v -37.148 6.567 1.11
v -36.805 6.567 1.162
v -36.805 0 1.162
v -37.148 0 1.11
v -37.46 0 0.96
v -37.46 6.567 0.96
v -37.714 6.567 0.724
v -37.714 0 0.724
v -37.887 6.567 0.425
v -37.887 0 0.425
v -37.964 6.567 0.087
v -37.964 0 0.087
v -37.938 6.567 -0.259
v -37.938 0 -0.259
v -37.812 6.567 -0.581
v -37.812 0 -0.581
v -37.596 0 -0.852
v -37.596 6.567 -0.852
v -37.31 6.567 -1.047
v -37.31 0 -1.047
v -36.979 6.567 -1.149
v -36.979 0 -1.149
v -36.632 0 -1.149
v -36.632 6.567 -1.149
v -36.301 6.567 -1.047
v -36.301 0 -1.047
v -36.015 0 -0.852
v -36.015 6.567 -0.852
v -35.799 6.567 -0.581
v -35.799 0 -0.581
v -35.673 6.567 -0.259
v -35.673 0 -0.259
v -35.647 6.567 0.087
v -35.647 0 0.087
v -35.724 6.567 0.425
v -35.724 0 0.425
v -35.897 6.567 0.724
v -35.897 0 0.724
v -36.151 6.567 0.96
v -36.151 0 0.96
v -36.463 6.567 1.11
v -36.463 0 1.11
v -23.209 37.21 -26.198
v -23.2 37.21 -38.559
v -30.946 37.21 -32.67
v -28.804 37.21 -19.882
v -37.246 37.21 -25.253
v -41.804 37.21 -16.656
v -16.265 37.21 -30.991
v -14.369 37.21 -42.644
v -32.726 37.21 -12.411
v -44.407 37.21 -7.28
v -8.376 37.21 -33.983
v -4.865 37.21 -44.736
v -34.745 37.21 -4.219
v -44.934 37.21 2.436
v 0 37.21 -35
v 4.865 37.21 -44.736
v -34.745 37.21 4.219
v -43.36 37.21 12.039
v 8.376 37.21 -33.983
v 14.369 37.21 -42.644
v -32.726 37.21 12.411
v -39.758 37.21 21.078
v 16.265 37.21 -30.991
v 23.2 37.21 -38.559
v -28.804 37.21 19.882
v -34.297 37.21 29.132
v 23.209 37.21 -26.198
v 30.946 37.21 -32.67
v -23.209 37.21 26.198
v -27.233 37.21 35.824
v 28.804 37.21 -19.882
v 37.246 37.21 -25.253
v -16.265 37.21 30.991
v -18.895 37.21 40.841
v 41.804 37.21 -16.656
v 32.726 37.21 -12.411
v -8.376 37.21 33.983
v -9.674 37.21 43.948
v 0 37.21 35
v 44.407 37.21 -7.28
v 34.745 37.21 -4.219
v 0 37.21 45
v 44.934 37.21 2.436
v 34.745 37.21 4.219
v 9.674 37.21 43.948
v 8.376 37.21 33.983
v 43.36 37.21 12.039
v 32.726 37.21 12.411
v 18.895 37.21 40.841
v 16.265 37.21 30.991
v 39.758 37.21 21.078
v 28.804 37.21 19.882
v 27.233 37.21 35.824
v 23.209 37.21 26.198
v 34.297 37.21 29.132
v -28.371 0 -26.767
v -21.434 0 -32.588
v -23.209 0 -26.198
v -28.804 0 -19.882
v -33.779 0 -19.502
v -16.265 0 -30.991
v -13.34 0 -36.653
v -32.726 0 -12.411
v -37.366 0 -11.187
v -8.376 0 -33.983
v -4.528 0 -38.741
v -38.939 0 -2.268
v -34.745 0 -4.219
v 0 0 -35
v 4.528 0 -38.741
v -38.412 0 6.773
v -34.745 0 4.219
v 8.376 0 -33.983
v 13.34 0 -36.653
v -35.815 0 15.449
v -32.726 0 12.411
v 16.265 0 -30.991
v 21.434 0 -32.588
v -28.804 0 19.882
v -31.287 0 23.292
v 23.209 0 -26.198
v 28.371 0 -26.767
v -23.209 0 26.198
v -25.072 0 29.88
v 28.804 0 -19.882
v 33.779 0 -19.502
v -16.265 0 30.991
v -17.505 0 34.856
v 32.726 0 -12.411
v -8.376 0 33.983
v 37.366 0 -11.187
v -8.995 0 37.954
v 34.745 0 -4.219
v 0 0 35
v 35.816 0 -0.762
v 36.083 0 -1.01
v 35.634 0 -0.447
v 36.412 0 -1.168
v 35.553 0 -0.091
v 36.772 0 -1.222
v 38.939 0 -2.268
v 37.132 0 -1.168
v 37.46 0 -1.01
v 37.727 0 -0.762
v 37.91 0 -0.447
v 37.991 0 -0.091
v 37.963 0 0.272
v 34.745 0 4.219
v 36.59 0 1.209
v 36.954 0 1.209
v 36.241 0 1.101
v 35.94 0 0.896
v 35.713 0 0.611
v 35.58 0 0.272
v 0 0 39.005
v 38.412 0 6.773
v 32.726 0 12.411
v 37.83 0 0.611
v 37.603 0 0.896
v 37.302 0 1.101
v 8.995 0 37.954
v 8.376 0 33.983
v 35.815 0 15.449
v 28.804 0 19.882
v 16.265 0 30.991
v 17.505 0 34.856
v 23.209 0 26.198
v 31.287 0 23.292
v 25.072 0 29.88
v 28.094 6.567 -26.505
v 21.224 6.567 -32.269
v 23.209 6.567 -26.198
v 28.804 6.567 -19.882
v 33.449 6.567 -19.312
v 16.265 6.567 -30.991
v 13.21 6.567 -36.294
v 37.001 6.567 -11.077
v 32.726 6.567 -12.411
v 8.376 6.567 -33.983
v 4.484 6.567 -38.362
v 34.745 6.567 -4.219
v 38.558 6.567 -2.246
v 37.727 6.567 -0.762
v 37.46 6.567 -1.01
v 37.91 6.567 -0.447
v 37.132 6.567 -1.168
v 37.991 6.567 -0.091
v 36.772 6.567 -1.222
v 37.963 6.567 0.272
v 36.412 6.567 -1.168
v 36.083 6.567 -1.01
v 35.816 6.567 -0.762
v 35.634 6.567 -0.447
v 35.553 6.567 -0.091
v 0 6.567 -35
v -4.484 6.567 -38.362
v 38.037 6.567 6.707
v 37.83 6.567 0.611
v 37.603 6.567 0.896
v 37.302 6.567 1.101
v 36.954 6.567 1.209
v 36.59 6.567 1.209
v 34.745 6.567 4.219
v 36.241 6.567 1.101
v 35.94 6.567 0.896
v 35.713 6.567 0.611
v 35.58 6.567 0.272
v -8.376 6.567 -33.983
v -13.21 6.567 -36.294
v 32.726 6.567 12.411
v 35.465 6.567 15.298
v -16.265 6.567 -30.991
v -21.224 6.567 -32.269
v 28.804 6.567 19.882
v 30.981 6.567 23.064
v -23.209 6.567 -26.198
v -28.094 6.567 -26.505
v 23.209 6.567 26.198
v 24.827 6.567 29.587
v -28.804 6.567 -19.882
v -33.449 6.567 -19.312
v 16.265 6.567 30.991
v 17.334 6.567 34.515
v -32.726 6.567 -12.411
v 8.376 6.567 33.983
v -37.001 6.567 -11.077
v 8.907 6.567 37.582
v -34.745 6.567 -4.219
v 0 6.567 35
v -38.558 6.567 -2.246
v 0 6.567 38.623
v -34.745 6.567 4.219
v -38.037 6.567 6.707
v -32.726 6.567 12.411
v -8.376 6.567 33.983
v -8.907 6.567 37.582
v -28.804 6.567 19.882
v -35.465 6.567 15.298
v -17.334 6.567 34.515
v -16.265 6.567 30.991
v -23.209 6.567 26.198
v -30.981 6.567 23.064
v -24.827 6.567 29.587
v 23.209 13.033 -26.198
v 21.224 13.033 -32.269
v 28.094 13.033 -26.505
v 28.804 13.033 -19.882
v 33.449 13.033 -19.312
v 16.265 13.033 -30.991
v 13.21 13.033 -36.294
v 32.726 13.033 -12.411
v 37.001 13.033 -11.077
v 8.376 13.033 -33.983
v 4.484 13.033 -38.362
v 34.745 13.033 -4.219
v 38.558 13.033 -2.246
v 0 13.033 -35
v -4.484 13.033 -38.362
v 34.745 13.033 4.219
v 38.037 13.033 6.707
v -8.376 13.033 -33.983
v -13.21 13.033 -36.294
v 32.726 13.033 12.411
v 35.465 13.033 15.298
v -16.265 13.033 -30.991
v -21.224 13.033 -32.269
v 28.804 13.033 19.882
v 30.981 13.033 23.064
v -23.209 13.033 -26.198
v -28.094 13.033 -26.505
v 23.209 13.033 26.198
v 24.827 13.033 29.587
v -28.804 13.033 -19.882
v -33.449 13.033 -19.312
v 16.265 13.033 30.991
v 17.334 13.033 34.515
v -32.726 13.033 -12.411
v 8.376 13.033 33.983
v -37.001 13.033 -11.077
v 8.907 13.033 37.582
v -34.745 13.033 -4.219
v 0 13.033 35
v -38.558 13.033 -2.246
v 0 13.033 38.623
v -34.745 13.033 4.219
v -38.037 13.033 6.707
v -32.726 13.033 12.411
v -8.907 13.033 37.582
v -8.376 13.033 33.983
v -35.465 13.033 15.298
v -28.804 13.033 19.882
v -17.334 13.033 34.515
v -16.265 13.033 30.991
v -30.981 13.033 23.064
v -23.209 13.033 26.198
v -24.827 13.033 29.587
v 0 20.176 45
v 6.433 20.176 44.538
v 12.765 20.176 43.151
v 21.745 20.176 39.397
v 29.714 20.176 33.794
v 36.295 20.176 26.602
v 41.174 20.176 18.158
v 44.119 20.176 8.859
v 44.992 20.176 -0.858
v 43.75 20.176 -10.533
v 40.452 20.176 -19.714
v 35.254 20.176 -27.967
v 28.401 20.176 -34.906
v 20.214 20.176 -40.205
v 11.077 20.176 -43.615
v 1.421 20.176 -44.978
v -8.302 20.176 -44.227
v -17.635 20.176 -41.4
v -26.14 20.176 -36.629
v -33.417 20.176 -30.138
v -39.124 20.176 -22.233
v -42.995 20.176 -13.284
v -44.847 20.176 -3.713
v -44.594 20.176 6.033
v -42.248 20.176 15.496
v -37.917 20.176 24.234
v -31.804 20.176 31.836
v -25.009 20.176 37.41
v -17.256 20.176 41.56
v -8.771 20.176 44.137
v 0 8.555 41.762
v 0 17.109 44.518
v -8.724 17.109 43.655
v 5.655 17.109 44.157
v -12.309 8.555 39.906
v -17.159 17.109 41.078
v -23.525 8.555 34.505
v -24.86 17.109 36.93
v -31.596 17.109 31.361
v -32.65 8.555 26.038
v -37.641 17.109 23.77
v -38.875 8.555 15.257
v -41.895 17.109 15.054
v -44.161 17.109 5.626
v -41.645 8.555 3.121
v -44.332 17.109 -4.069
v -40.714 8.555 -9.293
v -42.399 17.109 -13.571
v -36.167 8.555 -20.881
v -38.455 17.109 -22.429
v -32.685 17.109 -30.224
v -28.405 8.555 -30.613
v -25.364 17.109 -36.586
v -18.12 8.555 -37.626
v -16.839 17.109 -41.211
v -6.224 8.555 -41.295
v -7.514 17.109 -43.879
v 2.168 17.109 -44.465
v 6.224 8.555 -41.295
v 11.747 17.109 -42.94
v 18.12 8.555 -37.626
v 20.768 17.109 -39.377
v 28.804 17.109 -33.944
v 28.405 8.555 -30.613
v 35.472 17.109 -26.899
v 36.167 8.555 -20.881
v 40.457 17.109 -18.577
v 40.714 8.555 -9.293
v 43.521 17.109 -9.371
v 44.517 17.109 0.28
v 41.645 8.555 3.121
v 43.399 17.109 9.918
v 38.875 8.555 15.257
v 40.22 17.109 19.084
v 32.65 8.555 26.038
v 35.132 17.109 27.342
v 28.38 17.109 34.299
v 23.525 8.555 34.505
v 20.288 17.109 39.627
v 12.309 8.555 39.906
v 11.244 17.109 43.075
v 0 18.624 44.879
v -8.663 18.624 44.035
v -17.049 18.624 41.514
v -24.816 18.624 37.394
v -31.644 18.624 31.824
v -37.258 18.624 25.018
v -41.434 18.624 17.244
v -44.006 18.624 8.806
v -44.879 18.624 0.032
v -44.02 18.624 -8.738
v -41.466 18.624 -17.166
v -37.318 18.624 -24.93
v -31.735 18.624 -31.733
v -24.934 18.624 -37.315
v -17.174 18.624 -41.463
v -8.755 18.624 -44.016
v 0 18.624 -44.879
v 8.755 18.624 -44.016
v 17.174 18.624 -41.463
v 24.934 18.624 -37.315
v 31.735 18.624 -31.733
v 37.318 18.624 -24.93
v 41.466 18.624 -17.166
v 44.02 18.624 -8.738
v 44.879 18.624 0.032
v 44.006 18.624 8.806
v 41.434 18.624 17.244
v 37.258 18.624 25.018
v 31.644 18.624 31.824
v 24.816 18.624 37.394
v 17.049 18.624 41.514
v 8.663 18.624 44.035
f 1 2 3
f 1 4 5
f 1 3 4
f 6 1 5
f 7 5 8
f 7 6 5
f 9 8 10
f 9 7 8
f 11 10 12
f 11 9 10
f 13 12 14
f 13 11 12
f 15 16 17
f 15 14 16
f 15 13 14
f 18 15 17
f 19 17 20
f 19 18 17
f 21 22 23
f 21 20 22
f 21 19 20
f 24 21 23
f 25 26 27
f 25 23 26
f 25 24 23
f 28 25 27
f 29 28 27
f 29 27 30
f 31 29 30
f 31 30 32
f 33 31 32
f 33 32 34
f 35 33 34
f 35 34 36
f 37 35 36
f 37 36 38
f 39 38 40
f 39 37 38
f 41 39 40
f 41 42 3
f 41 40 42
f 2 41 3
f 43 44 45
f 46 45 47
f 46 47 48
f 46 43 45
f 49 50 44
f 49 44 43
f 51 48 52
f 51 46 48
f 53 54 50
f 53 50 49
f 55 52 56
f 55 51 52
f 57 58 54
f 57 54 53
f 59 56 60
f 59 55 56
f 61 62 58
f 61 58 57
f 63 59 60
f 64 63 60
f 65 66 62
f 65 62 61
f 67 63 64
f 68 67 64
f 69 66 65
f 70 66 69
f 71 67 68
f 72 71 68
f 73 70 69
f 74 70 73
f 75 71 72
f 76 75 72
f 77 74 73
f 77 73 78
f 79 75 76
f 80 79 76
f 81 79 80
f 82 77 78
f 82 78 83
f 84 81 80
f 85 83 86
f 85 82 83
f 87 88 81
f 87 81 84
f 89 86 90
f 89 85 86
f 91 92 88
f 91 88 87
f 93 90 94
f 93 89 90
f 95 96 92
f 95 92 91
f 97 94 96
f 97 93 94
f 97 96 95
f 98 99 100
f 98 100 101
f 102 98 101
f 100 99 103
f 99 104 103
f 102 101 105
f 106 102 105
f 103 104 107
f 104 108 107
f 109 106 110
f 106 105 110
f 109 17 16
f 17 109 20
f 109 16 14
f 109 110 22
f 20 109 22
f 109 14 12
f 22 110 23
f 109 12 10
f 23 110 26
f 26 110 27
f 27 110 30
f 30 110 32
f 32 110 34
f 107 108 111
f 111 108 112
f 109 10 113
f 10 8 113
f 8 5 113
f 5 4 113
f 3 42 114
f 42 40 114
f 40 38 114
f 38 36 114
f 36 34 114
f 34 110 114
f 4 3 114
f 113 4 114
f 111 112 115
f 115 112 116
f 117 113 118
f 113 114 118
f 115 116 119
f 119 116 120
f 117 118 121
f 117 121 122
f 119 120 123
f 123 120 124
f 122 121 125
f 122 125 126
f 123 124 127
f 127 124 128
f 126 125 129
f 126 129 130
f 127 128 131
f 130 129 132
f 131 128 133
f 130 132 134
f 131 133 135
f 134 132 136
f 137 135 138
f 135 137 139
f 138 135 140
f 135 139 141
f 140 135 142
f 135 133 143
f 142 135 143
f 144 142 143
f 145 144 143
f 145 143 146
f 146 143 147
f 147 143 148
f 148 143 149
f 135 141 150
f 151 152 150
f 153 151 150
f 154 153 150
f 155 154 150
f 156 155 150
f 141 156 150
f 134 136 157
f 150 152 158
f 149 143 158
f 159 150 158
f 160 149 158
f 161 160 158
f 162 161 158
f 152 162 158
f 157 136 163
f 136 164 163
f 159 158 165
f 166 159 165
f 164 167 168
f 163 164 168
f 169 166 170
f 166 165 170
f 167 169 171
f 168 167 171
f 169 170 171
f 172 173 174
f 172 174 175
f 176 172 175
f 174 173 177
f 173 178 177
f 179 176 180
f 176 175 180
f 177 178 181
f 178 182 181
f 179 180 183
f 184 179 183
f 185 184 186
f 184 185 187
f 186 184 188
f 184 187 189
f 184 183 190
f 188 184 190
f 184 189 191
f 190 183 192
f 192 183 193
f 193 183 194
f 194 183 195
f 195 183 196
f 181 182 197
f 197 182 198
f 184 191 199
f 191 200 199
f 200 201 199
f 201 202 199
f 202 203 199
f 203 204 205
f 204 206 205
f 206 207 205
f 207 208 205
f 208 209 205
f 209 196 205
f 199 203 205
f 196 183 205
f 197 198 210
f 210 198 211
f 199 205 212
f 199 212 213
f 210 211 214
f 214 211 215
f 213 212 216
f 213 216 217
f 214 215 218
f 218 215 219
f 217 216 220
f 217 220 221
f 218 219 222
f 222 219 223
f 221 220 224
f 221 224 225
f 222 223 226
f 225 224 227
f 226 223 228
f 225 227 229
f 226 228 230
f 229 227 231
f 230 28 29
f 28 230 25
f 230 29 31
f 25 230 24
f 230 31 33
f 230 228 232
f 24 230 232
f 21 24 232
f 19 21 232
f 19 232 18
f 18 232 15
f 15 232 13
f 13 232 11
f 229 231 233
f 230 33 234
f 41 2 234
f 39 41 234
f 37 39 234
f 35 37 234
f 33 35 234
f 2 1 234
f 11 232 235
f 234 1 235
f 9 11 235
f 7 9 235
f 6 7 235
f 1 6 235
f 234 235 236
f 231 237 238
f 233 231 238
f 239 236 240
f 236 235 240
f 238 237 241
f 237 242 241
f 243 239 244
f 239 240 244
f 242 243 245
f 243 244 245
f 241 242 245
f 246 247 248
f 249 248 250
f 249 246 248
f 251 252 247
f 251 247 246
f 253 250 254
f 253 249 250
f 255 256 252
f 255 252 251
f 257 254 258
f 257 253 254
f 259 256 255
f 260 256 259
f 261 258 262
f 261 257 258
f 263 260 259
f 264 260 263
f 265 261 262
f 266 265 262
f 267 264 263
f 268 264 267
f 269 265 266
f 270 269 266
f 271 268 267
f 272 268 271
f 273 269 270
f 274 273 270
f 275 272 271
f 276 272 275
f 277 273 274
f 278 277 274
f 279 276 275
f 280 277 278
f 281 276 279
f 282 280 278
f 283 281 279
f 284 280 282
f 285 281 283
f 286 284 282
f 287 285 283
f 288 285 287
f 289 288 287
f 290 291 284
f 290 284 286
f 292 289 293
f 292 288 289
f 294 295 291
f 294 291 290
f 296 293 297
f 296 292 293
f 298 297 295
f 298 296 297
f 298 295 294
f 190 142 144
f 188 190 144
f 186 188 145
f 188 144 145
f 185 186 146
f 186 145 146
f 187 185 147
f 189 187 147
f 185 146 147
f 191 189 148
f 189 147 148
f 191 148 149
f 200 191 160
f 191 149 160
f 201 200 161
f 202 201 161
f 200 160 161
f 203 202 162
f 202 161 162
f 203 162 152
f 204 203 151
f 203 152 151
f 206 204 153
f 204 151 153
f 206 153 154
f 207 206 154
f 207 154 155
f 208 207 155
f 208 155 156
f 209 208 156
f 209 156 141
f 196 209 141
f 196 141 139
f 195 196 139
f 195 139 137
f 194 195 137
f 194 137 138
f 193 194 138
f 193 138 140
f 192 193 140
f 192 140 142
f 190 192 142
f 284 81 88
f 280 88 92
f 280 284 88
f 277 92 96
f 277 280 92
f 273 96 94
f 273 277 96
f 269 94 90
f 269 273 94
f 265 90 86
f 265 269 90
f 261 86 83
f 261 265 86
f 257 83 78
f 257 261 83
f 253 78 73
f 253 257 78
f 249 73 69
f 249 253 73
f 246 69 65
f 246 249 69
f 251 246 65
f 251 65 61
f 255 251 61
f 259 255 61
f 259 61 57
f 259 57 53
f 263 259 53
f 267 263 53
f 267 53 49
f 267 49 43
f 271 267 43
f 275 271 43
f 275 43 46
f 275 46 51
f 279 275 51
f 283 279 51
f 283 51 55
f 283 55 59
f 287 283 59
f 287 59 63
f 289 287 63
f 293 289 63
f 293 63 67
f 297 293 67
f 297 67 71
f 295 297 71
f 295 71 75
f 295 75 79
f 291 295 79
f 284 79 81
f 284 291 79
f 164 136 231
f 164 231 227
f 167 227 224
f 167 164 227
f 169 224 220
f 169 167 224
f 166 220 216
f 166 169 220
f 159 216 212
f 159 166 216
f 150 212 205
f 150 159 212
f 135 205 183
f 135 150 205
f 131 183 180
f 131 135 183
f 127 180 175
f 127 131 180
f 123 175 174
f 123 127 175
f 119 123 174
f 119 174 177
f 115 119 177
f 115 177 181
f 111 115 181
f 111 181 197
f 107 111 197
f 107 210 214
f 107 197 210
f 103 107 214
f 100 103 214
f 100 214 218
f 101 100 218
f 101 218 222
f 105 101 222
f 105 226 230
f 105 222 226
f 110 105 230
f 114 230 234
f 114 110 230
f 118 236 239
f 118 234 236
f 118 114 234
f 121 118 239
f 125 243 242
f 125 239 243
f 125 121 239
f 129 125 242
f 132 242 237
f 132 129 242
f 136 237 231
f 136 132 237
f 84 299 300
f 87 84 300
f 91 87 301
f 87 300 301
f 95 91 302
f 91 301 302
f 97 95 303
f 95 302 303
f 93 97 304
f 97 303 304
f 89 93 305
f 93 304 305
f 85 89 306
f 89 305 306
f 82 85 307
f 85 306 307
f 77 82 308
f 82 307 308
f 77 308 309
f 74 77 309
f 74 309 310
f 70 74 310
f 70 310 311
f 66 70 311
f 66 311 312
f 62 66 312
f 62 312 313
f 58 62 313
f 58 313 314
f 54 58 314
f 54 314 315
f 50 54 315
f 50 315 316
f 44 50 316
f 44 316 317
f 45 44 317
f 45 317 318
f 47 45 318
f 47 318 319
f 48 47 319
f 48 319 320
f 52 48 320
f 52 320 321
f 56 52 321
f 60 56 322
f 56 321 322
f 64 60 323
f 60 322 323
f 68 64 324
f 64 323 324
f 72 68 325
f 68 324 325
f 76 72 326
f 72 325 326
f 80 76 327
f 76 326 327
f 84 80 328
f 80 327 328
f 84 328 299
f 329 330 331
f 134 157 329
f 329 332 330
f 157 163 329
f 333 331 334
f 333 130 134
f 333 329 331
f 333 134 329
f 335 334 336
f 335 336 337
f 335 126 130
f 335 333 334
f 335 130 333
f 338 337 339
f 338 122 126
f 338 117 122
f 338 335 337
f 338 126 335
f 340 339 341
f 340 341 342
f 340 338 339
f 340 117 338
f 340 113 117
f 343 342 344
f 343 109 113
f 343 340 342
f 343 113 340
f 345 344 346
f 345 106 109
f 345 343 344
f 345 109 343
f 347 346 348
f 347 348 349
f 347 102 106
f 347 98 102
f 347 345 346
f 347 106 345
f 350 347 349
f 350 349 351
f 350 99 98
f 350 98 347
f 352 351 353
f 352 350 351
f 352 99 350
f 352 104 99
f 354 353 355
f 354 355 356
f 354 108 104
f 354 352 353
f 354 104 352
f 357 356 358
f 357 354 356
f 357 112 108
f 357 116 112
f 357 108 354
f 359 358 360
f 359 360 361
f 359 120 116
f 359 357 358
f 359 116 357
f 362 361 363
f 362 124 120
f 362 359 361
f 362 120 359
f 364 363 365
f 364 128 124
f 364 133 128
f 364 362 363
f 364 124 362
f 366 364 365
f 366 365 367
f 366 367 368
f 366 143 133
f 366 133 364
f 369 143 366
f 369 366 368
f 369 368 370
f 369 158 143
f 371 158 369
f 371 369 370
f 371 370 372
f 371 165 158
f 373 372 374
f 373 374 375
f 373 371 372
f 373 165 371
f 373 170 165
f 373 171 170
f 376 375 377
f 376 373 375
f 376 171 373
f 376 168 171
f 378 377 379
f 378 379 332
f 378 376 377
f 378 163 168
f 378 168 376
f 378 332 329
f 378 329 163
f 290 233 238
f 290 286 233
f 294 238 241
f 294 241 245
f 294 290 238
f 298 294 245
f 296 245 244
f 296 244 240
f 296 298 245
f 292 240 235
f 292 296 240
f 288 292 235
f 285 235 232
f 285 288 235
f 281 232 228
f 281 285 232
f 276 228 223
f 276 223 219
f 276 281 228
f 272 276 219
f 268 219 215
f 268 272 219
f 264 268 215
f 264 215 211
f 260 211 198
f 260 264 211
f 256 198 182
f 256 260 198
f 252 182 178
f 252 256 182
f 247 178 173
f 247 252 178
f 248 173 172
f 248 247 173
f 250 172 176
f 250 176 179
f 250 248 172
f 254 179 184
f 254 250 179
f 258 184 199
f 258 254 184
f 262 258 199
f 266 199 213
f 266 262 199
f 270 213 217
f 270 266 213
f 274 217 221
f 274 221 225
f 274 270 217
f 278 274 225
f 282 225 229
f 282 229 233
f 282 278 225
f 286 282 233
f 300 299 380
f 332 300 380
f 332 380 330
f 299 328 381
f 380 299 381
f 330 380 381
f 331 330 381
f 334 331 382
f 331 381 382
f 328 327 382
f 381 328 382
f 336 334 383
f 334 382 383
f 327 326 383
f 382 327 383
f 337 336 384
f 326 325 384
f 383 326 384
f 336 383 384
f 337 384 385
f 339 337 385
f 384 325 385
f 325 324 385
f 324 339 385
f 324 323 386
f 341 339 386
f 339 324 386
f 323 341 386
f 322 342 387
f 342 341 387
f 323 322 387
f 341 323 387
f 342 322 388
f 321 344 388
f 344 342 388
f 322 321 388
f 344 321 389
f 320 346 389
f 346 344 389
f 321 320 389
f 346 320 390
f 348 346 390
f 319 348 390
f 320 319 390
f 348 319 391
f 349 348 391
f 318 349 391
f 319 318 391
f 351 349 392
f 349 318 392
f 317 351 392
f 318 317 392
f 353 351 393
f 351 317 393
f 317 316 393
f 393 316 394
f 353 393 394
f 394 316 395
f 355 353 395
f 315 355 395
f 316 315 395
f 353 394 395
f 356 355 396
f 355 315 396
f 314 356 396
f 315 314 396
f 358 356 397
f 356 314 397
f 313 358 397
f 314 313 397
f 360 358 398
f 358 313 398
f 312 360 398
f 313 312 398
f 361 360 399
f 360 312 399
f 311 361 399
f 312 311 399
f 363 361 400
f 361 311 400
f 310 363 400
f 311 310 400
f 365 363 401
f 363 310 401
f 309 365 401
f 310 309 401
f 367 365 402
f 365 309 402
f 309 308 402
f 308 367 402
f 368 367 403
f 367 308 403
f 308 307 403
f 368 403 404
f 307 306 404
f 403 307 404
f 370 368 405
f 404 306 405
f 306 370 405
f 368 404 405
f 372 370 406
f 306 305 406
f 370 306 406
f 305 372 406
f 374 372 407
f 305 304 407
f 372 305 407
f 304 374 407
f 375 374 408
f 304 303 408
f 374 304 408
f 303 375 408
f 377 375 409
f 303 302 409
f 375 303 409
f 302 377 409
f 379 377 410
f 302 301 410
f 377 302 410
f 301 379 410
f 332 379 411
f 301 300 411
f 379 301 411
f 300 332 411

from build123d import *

# Parameters (mm, degrees)
SKETCH1_R               = 45
SKETCH1_R_2             = 35
BOSS_EXTRUDE1_DEPTH     = 37.21
FILLET1_R               = 10
SKETCH3_W               = 3.623403209
SKETCH3_H               = 6.465591727
CUT_EXTRUDE3_DEPTH      = 74.719632638
CUT_EXTRUDE3_DEPTH_BACK = 10
SKETCH4_R               = 1.161936473
SKETCH5_R               = 1.222255242
CUT_EXTRUDE4_DEPTH      = 10


with BuildPart() as part:
    # Sketch1 → Boss-Extrude1 (new body)
    with BuildSketch(Plane(origin=(0, 0, 0), x_dir=(1, 0, 0), z_dir=(0, 1, 0))):
        with Locations(Location((0, 0, 0), (0, 0, 270))):
            Circle(SKETCH1_R)
        with Locations(Location((0, 0, 0), (0, 0, 270))):
            Circle(SKETCH1_R_2, mode=Mode.SUBTRACT)
    extrude(amount=BOSS_EXTRUDE1_DEPTH)

    # Sketch2 → Cut-Revolve2 (revolve, cut)
    with BuildSketch(Plane(origin=(0, 0, 0), x_dir=(0, 0, -1), z_dir=(1, 0, 0)), mode=Mode.PRIVATE) as cut_revolve2_sk:
        Polygon((45, 18.605), (39.004948157, 0), (45, 0), align=None)
    revolve(cut_revolve2_sk.sketch.rotate(Axis((0, 37.21, 0), (0, -1, 0)), 180), axis=Axis((0, 37.21, 0), (0, -1, 0)), mode=Mode.SUBTRACT)

    # Fillet1
    fillet1_edges = [part.edges().sort_by_distance(p)[0] for p in [
        (0, 18.605, -45),
    ]]
    fillet(fillet1_edges, radius=FILLET1_R)

    # Sketch3 → Cut-Revolve3 (revolve, cut)
    with BuildSketch(Plane(origin=(0, 0, 0), x_dir=(0, 0, -1), z_dir=(1, 0, 0))):
        with Locations((-36.811701605, 9.799884952)):
            Rectangle(SKETCH3_W, SKETCH3_H)
    revolve(axis=Axis((0, 37.21, 0), (0, -1, 0)), mode=Mode.SUBTRACT)

    # Sketch4 → Cut-Extrude3 (cut, two sides: drawn at the far end of the back side and taken through both)
    with BuildSketch(Plane(origin=(0, 0, 0), x_dir=(-1, 0, 0), z_dir=(0, -1, 0)).offset(-CUT_EXTRUDE3_DEPTH_BACK)):
        with Locations(Location((36.80548689, 0, 0), (0, 0, 270))):
            Circle(SKETCH4_R)
    extrude(amount=CUT_EXTRUDE3_DEPTH + CUT_EXTRUDE3_DEPTH_BACK, mode=Mode.SUBTRACT)

    # Sketch5 → Cut-Extrude4 (cut)
    with BuildSketch(Plane(origin=(0, 0, 0), x_dir=(-1, 0, 0), z_dir=(0, -1, 0))):
        with Locations(Location((-36.771801863, 0, 0), (0, 0, 90))):
            Circle(SKETCH5_R)
    extrude(amount=-CUT_EXTRUDE4_DEPTH, mode=Mode.SUBTRACT)


solid = part.part
